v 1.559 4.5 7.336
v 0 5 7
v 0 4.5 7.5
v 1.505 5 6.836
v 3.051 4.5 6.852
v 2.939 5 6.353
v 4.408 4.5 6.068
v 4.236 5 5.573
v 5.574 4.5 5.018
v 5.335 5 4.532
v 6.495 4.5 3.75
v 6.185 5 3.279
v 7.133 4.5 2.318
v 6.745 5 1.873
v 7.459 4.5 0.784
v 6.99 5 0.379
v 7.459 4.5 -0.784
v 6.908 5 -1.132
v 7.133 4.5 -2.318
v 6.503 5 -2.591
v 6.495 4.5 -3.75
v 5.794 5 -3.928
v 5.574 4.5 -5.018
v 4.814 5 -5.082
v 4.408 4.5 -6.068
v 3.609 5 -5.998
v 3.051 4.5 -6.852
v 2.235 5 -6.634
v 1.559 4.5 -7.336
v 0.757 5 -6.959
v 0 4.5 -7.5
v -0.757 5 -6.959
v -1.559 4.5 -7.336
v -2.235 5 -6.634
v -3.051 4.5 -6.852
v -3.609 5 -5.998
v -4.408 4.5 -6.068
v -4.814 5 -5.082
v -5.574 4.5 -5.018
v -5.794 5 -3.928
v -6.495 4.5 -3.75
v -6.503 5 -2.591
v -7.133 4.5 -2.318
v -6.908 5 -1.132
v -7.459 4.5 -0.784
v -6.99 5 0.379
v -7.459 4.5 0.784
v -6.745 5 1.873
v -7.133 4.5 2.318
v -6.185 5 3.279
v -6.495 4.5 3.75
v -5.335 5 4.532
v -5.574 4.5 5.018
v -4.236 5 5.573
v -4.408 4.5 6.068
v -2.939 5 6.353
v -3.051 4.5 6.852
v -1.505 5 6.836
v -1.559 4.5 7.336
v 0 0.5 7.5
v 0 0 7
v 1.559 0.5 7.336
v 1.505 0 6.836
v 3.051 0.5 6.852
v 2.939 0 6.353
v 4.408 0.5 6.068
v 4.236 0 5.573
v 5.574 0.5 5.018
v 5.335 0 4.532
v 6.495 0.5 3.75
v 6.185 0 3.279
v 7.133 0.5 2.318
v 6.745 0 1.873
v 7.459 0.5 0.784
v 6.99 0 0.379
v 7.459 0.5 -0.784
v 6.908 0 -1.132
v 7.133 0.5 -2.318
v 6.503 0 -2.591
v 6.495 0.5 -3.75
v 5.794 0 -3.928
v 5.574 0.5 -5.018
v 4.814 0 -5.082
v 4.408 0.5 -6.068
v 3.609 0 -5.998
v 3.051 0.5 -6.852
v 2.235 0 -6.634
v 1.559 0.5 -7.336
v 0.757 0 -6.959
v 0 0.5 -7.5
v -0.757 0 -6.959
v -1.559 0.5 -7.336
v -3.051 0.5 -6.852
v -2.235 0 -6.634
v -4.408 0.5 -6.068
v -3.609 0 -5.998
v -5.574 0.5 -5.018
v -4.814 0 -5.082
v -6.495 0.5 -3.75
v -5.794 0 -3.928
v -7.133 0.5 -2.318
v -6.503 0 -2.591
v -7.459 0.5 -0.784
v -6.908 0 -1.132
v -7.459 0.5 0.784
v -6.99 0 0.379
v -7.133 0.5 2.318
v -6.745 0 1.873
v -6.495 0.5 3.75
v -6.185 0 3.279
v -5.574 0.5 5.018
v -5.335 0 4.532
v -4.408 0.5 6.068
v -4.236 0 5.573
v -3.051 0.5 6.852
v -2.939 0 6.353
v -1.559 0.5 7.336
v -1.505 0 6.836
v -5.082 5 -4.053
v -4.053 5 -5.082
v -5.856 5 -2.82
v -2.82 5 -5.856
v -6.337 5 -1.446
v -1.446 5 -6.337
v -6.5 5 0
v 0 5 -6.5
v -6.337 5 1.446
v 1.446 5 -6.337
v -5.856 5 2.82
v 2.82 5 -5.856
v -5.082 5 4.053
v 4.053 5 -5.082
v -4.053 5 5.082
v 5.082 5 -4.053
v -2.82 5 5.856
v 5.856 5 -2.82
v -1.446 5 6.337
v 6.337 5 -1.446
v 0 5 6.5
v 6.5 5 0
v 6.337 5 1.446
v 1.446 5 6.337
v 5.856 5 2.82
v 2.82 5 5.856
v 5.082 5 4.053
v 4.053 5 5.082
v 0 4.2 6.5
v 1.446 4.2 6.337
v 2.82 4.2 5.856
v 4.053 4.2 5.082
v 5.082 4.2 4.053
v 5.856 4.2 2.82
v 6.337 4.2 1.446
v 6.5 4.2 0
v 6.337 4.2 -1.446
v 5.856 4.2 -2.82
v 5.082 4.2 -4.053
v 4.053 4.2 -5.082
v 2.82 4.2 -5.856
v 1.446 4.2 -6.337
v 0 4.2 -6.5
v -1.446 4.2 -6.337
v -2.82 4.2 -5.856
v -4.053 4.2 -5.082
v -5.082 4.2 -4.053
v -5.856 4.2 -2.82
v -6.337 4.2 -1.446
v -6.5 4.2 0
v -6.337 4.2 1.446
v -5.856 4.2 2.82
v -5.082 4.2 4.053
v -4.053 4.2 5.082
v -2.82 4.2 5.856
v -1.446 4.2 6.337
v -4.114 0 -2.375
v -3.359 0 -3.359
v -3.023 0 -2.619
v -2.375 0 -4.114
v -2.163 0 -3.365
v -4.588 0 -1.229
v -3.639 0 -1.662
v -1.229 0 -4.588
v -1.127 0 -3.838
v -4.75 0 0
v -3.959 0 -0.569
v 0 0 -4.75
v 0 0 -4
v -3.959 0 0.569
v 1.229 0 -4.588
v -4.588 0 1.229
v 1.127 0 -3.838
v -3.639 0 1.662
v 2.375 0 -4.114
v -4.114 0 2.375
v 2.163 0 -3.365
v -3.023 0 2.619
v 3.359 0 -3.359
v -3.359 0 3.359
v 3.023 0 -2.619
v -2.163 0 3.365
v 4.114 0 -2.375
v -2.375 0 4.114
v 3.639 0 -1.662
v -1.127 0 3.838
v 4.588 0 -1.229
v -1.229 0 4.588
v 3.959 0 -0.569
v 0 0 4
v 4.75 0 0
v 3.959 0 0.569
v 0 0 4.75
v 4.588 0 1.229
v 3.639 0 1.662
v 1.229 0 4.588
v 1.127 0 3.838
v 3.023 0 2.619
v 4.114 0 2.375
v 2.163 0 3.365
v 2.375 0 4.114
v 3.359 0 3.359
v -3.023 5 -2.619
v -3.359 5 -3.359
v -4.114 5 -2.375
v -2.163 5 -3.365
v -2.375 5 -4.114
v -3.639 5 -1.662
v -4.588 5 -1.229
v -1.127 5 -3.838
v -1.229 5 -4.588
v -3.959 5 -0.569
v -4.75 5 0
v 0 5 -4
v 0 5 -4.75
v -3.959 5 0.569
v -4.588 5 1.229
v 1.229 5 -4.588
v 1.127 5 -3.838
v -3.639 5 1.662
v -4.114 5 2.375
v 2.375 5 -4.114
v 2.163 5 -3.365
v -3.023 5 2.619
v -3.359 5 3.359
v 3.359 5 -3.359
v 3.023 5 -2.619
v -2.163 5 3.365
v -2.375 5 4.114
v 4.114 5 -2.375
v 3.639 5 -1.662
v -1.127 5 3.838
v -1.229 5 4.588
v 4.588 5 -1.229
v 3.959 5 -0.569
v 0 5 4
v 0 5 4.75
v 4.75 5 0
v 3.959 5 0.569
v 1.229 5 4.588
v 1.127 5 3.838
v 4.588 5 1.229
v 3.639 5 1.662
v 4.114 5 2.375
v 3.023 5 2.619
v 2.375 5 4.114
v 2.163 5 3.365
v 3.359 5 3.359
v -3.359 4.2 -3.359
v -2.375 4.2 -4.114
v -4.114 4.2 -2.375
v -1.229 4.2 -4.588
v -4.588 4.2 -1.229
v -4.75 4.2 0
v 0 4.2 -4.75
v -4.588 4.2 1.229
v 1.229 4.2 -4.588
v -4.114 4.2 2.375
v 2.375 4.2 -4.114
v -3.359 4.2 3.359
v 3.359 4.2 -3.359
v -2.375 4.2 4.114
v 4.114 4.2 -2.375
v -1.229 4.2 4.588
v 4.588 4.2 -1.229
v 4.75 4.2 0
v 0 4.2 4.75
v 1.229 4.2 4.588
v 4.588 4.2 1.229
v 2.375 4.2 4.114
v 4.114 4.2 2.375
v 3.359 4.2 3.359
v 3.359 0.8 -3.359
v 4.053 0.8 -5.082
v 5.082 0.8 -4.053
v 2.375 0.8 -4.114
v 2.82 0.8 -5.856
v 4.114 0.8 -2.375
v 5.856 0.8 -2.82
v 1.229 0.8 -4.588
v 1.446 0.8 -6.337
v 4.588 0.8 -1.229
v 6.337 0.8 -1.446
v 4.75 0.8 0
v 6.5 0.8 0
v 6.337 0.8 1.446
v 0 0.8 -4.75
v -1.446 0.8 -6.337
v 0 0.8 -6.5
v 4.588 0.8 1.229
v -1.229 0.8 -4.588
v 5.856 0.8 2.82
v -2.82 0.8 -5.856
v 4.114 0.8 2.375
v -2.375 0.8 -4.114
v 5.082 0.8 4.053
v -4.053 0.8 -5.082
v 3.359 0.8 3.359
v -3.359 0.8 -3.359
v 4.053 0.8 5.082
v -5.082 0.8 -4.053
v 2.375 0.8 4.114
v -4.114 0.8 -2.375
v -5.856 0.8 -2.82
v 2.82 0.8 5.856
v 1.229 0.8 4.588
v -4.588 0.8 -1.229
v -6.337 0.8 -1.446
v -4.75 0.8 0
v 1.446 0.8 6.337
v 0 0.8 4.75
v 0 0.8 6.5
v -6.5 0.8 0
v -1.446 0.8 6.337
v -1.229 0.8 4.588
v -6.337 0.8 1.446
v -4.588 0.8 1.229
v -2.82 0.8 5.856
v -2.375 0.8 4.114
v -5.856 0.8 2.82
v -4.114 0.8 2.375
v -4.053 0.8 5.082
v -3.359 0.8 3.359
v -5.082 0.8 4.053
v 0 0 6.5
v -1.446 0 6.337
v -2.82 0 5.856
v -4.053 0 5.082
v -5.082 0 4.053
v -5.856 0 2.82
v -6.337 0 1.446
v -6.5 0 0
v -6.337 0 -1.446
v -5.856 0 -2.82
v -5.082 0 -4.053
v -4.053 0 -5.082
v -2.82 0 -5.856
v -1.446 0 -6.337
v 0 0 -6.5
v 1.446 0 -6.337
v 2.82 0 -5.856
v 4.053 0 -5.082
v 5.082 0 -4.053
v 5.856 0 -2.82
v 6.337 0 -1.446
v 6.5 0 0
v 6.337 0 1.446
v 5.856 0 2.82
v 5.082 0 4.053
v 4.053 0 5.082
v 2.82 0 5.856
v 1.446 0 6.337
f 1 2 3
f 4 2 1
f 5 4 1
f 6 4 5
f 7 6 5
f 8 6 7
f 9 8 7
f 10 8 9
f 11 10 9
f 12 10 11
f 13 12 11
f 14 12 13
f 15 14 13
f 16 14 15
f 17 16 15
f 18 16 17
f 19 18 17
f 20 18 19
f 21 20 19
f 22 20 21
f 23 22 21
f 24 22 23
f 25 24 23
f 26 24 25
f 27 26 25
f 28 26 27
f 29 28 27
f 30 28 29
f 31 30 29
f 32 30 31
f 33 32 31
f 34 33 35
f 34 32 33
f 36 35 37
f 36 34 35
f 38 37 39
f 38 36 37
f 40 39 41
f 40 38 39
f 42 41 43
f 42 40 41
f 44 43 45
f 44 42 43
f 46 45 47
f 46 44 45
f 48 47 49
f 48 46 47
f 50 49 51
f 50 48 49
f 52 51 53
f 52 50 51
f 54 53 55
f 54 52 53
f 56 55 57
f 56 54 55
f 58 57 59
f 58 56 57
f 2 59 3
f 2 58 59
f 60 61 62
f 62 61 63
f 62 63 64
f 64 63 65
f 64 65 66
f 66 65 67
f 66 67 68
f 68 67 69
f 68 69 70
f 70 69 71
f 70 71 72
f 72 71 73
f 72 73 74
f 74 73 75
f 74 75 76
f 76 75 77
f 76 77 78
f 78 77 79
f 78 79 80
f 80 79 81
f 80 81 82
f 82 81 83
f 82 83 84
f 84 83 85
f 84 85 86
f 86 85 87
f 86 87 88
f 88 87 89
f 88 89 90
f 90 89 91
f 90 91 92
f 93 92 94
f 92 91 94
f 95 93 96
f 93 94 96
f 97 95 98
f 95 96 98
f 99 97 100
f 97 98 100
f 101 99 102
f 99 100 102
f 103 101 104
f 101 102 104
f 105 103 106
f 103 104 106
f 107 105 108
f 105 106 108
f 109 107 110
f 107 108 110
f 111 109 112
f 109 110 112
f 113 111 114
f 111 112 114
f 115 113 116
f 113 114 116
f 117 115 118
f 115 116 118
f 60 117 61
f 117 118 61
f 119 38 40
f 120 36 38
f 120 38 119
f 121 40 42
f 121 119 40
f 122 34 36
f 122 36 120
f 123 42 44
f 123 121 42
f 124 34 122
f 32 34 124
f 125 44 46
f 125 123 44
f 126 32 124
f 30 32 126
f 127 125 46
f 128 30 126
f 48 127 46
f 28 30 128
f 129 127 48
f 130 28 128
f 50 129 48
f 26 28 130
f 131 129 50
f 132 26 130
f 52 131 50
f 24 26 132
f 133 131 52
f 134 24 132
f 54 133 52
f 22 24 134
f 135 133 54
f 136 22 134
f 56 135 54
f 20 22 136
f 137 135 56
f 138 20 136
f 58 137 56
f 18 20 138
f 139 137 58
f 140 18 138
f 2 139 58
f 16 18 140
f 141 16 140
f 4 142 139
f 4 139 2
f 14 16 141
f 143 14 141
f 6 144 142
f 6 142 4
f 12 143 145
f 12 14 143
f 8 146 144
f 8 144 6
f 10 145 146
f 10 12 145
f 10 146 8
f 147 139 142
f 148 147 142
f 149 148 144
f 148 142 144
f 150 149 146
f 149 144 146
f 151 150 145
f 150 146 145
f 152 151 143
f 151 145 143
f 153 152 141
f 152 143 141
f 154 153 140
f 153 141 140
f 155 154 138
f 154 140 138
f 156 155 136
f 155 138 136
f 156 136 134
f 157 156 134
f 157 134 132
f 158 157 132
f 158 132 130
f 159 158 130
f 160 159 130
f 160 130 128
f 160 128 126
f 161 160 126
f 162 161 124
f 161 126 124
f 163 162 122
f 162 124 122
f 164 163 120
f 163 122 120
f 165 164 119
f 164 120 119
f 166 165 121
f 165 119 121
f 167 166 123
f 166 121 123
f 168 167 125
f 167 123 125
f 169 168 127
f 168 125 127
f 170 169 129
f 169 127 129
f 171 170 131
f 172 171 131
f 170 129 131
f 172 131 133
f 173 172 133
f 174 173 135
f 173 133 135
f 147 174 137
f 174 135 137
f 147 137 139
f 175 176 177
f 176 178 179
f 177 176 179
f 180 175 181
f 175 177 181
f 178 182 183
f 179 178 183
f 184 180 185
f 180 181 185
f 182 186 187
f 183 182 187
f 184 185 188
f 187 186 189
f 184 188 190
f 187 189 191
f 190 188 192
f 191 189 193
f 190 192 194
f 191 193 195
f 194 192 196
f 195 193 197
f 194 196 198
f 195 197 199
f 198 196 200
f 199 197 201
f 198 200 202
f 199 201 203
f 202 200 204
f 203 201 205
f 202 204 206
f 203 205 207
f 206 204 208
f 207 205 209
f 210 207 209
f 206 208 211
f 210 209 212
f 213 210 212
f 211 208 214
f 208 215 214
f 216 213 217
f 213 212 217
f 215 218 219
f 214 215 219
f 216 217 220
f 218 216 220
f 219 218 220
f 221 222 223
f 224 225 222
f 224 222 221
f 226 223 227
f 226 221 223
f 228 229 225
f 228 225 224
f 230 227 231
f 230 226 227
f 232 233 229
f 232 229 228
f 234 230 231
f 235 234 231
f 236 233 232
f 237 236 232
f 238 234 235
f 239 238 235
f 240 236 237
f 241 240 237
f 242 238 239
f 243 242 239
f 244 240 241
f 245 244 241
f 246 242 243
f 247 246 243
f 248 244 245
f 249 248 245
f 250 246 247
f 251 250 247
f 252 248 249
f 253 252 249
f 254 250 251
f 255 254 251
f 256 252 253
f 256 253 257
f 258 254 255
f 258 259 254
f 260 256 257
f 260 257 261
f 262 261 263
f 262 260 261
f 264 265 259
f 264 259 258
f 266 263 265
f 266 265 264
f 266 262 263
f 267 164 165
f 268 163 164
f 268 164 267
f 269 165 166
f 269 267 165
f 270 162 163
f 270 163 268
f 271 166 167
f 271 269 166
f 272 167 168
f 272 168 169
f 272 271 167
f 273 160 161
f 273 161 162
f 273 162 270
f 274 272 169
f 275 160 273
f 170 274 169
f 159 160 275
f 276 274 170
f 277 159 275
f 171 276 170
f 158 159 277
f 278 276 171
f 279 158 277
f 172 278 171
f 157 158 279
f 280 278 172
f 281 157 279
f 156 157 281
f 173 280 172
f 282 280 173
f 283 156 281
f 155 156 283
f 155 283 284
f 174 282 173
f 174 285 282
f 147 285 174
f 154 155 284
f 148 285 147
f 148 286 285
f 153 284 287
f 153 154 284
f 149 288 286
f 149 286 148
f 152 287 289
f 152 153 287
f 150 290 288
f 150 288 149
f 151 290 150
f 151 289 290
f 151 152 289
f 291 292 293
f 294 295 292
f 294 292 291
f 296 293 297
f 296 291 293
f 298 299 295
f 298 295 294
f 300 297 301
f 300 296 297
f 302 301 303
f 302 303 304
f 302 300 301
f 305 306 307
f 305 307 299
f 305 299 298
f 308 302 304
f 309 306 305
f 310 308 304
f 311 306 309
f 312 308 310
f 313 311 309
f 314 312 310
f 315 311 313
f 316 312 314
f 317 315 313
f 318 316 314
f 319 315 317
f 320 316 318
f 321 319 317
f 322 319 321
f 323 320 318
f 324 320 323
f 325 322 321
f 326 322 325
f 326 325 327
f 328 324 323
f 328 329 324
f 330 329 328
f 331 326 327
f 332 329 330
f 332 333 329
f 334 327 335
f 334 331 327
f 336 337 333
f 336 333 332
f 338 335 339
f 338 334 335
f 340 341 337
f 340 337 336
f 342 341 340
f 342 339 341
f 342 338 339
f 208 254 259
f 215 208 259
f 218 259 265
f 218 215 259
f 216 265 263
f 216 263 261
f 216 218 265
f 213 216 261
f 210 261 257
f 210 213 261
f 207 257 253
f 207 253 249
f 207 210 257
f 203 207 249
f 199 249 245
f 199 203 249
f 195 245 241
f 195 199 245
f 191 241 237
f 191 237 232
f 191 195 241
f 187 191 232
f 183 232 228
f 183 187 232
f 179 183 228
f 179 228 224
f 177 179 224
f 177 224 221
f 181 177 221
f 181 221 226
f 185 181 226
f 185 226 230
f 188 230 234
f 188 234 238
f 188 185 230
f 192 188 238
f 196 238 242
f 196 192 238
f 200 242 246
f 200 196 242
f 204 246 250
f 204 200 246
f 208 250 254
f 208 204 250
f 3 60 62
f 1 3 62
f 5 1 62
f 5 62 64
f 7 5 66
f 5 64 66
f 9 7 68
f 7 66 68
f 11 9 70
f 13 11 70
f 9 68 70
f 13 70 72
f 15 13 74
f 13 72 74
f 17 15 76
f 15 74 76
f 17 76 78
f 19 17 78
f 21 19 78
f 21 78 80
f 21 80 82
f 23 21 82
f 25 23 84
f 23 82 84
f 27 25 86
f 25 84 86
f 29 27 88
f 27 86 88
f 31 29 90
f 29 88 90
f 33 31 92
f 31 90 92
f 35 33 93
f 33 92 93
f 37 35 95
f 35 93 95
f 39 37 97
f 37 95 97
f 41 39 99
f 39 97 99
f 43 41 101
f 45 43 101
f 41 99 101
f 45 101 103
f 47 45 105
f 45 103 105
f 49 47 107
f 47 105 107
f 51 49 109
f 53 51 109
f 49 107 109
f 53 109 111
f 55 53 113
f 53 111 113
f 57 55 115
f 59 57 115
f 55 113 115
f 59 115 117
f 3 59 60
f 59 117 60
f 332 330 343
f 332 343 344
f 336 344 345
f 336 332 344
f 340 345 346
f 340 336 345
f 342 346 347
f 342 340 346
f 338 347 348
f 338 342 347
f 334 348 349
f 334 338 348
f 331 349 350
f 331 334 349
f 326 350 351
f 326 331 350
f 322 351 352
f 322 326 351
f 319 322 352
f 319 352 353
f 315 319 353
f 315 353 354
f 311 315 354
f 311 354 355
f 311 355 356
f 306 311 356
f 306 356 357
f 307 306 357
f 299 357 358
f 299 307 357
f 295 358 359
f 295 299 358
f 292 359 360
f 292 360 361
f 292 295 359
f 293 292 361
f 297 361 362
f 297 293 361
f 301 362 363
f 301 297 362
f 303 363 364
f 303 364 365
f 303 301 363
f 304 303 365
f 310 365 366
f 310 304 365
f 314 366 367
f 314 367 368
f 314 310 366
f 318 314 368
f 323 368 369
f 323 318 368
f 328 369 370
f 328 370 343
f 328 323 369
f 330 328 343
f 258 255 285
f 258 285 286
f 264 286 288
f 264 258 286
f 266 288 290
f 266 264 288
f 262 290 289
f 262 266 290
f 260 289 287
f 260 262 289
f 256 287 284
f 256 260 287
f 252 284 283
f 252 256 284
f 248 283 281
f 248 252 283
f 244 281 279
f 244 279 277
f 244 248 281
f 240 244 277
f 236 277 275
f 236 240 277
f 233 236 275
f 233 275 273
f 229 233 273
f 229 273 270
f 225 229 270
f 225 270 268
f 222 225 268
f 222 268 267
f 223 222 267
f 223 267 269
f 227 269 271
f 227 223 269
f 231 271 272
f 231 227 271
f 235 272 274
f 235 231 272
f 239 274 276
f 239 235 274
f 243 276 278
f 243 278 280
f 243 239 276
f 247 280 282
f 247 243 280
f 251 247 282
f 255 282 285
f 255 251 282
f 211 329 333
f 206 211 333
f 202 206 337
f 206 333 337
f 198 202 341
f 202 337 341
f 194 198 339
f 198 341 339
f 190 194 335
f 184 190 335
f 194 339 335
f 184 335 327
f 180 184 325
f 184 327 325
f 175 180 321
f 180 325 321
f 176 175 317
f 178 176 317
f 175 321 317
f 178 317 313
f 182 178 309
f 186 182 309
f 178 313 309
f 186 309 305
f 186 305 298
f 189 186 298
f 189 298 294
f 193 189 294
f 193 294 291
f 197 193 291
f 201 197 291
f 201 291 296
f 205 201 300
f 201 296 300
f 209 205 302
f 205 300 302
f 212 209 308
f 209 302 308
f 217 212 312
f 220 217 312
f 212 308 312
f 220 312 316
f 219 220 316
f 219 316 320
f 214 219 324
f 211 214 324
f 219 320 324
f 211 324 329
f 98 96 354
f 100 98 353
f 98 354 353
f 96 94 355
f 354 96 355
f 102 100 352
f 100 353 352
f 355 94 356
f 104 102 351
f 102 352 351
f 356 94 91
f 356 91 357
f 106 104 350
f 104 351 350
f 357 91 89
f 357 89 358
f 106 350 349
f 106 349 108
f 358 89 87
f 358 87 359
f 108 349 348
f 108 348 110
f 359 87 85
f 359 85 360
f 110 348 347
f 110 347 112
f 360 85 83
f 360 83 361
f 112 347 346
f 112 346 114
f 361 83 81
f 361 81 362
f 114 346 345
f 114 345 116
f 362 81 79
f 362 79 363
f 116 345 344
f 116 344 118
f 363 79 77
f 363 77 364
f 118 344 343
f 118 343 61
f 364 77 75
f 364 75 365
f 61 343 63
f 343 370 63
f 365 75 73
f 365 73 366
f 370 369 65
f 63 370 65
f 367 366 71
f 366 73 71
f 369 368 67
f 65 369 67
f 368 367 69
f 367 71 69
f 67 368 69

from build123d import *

# Parameters (mm, degrees)
SKETCH_1_R          = 7.5
SKETCH_1_R_2        = 4
EXTRUDE_1_DEPTH     = 5
CHAMFER_1_SIZE      = 0.5
CHAMFER_2_SIZE      = 0.5
SKETCH_2_R          = 6.5
SKETCH_2_R_2        = 4.75
CUT_EXTRUDE_1_DEPTH = 0.8
CUT_EXTRUDE_START   = -0.8
SKETCH_3_R          = 6.5
SKETCH_3_R_2        = 4.75
CUT_EXTRUDE_2_DEPTH = 0.8


with BuildPart() as part:
    # 草图1 → 凸台-拉伸1 (new body)
    with BuildSketch(Plane(origin=(0, 0, 0), x_dir=(1, 0, 0), z_dir=(0, 1, 0))):
        with Locations(Location((0, 0, 0), (0, 0, 270))):
            Circle(SKETCH_1_R)
        with Locations(Location((0, 0, 0), (0, 0, 270))):
            Circle(SKETCH_1_R_2, mode=Mode.SUBTRACT)
    extrude(amount=EXTRUDE_1_DEPTH)

    # 倒角1
    chamfer_1_edges = [part.edges().sort_by_distance(p)[0] for p in [
        (0, 5, -7.5),
    ]]
    chamfer(chamfer_1_edges, length=CHAMFER_1_SIZE)

    # 倒角2
    chamfer_2_edges = [part.edges().sort_by_distance(p)[0] for p in [
        (0, 0, -7.5),
    ]]
    chamfer(chamfer_2_edges, length=CHAMFER_2_SIZE)

    # 草图2 → 切除-拉伸1 (cut)
    with BuildSketch(Plane(origin=(0, 5, 0), x_dir=(1, 0, 0), z_dir=(0, 1, 0))):
        with Locations(Location((0, 0, 0), (0, 0, 270))):
            Circle(SKETCH_2_R)
        with Locations(Location((0, 0, 0), (0, 0, 270))):
            Circle(SKETCH_2_R_2, mode=Mode.SUBTRACT)
    extrude(amount=-CUT_EXTRUDE_1_DEPTH, mode=Mode.SUBTRACT)

    # 草图3 → 切除-拉伸2 (cut)
    with BuildSketch(Plane.XZ.offset(CUT_EXTRUDE_START)):
        with Locations(Location((0, 0, 0), (0, 0, 90))):
            Circle(SKETCH_3_R)
        with Locations(Location((0, 0, 0), (0, 0, 90))):
            Circle(SKETCH_3_R_2, mode=Mode.SUBTRACT)
    extrude(amount=CUT_EXTRUDE_2_DEPTH, mode=Mode.SUBTRACT)


solid = part.part
